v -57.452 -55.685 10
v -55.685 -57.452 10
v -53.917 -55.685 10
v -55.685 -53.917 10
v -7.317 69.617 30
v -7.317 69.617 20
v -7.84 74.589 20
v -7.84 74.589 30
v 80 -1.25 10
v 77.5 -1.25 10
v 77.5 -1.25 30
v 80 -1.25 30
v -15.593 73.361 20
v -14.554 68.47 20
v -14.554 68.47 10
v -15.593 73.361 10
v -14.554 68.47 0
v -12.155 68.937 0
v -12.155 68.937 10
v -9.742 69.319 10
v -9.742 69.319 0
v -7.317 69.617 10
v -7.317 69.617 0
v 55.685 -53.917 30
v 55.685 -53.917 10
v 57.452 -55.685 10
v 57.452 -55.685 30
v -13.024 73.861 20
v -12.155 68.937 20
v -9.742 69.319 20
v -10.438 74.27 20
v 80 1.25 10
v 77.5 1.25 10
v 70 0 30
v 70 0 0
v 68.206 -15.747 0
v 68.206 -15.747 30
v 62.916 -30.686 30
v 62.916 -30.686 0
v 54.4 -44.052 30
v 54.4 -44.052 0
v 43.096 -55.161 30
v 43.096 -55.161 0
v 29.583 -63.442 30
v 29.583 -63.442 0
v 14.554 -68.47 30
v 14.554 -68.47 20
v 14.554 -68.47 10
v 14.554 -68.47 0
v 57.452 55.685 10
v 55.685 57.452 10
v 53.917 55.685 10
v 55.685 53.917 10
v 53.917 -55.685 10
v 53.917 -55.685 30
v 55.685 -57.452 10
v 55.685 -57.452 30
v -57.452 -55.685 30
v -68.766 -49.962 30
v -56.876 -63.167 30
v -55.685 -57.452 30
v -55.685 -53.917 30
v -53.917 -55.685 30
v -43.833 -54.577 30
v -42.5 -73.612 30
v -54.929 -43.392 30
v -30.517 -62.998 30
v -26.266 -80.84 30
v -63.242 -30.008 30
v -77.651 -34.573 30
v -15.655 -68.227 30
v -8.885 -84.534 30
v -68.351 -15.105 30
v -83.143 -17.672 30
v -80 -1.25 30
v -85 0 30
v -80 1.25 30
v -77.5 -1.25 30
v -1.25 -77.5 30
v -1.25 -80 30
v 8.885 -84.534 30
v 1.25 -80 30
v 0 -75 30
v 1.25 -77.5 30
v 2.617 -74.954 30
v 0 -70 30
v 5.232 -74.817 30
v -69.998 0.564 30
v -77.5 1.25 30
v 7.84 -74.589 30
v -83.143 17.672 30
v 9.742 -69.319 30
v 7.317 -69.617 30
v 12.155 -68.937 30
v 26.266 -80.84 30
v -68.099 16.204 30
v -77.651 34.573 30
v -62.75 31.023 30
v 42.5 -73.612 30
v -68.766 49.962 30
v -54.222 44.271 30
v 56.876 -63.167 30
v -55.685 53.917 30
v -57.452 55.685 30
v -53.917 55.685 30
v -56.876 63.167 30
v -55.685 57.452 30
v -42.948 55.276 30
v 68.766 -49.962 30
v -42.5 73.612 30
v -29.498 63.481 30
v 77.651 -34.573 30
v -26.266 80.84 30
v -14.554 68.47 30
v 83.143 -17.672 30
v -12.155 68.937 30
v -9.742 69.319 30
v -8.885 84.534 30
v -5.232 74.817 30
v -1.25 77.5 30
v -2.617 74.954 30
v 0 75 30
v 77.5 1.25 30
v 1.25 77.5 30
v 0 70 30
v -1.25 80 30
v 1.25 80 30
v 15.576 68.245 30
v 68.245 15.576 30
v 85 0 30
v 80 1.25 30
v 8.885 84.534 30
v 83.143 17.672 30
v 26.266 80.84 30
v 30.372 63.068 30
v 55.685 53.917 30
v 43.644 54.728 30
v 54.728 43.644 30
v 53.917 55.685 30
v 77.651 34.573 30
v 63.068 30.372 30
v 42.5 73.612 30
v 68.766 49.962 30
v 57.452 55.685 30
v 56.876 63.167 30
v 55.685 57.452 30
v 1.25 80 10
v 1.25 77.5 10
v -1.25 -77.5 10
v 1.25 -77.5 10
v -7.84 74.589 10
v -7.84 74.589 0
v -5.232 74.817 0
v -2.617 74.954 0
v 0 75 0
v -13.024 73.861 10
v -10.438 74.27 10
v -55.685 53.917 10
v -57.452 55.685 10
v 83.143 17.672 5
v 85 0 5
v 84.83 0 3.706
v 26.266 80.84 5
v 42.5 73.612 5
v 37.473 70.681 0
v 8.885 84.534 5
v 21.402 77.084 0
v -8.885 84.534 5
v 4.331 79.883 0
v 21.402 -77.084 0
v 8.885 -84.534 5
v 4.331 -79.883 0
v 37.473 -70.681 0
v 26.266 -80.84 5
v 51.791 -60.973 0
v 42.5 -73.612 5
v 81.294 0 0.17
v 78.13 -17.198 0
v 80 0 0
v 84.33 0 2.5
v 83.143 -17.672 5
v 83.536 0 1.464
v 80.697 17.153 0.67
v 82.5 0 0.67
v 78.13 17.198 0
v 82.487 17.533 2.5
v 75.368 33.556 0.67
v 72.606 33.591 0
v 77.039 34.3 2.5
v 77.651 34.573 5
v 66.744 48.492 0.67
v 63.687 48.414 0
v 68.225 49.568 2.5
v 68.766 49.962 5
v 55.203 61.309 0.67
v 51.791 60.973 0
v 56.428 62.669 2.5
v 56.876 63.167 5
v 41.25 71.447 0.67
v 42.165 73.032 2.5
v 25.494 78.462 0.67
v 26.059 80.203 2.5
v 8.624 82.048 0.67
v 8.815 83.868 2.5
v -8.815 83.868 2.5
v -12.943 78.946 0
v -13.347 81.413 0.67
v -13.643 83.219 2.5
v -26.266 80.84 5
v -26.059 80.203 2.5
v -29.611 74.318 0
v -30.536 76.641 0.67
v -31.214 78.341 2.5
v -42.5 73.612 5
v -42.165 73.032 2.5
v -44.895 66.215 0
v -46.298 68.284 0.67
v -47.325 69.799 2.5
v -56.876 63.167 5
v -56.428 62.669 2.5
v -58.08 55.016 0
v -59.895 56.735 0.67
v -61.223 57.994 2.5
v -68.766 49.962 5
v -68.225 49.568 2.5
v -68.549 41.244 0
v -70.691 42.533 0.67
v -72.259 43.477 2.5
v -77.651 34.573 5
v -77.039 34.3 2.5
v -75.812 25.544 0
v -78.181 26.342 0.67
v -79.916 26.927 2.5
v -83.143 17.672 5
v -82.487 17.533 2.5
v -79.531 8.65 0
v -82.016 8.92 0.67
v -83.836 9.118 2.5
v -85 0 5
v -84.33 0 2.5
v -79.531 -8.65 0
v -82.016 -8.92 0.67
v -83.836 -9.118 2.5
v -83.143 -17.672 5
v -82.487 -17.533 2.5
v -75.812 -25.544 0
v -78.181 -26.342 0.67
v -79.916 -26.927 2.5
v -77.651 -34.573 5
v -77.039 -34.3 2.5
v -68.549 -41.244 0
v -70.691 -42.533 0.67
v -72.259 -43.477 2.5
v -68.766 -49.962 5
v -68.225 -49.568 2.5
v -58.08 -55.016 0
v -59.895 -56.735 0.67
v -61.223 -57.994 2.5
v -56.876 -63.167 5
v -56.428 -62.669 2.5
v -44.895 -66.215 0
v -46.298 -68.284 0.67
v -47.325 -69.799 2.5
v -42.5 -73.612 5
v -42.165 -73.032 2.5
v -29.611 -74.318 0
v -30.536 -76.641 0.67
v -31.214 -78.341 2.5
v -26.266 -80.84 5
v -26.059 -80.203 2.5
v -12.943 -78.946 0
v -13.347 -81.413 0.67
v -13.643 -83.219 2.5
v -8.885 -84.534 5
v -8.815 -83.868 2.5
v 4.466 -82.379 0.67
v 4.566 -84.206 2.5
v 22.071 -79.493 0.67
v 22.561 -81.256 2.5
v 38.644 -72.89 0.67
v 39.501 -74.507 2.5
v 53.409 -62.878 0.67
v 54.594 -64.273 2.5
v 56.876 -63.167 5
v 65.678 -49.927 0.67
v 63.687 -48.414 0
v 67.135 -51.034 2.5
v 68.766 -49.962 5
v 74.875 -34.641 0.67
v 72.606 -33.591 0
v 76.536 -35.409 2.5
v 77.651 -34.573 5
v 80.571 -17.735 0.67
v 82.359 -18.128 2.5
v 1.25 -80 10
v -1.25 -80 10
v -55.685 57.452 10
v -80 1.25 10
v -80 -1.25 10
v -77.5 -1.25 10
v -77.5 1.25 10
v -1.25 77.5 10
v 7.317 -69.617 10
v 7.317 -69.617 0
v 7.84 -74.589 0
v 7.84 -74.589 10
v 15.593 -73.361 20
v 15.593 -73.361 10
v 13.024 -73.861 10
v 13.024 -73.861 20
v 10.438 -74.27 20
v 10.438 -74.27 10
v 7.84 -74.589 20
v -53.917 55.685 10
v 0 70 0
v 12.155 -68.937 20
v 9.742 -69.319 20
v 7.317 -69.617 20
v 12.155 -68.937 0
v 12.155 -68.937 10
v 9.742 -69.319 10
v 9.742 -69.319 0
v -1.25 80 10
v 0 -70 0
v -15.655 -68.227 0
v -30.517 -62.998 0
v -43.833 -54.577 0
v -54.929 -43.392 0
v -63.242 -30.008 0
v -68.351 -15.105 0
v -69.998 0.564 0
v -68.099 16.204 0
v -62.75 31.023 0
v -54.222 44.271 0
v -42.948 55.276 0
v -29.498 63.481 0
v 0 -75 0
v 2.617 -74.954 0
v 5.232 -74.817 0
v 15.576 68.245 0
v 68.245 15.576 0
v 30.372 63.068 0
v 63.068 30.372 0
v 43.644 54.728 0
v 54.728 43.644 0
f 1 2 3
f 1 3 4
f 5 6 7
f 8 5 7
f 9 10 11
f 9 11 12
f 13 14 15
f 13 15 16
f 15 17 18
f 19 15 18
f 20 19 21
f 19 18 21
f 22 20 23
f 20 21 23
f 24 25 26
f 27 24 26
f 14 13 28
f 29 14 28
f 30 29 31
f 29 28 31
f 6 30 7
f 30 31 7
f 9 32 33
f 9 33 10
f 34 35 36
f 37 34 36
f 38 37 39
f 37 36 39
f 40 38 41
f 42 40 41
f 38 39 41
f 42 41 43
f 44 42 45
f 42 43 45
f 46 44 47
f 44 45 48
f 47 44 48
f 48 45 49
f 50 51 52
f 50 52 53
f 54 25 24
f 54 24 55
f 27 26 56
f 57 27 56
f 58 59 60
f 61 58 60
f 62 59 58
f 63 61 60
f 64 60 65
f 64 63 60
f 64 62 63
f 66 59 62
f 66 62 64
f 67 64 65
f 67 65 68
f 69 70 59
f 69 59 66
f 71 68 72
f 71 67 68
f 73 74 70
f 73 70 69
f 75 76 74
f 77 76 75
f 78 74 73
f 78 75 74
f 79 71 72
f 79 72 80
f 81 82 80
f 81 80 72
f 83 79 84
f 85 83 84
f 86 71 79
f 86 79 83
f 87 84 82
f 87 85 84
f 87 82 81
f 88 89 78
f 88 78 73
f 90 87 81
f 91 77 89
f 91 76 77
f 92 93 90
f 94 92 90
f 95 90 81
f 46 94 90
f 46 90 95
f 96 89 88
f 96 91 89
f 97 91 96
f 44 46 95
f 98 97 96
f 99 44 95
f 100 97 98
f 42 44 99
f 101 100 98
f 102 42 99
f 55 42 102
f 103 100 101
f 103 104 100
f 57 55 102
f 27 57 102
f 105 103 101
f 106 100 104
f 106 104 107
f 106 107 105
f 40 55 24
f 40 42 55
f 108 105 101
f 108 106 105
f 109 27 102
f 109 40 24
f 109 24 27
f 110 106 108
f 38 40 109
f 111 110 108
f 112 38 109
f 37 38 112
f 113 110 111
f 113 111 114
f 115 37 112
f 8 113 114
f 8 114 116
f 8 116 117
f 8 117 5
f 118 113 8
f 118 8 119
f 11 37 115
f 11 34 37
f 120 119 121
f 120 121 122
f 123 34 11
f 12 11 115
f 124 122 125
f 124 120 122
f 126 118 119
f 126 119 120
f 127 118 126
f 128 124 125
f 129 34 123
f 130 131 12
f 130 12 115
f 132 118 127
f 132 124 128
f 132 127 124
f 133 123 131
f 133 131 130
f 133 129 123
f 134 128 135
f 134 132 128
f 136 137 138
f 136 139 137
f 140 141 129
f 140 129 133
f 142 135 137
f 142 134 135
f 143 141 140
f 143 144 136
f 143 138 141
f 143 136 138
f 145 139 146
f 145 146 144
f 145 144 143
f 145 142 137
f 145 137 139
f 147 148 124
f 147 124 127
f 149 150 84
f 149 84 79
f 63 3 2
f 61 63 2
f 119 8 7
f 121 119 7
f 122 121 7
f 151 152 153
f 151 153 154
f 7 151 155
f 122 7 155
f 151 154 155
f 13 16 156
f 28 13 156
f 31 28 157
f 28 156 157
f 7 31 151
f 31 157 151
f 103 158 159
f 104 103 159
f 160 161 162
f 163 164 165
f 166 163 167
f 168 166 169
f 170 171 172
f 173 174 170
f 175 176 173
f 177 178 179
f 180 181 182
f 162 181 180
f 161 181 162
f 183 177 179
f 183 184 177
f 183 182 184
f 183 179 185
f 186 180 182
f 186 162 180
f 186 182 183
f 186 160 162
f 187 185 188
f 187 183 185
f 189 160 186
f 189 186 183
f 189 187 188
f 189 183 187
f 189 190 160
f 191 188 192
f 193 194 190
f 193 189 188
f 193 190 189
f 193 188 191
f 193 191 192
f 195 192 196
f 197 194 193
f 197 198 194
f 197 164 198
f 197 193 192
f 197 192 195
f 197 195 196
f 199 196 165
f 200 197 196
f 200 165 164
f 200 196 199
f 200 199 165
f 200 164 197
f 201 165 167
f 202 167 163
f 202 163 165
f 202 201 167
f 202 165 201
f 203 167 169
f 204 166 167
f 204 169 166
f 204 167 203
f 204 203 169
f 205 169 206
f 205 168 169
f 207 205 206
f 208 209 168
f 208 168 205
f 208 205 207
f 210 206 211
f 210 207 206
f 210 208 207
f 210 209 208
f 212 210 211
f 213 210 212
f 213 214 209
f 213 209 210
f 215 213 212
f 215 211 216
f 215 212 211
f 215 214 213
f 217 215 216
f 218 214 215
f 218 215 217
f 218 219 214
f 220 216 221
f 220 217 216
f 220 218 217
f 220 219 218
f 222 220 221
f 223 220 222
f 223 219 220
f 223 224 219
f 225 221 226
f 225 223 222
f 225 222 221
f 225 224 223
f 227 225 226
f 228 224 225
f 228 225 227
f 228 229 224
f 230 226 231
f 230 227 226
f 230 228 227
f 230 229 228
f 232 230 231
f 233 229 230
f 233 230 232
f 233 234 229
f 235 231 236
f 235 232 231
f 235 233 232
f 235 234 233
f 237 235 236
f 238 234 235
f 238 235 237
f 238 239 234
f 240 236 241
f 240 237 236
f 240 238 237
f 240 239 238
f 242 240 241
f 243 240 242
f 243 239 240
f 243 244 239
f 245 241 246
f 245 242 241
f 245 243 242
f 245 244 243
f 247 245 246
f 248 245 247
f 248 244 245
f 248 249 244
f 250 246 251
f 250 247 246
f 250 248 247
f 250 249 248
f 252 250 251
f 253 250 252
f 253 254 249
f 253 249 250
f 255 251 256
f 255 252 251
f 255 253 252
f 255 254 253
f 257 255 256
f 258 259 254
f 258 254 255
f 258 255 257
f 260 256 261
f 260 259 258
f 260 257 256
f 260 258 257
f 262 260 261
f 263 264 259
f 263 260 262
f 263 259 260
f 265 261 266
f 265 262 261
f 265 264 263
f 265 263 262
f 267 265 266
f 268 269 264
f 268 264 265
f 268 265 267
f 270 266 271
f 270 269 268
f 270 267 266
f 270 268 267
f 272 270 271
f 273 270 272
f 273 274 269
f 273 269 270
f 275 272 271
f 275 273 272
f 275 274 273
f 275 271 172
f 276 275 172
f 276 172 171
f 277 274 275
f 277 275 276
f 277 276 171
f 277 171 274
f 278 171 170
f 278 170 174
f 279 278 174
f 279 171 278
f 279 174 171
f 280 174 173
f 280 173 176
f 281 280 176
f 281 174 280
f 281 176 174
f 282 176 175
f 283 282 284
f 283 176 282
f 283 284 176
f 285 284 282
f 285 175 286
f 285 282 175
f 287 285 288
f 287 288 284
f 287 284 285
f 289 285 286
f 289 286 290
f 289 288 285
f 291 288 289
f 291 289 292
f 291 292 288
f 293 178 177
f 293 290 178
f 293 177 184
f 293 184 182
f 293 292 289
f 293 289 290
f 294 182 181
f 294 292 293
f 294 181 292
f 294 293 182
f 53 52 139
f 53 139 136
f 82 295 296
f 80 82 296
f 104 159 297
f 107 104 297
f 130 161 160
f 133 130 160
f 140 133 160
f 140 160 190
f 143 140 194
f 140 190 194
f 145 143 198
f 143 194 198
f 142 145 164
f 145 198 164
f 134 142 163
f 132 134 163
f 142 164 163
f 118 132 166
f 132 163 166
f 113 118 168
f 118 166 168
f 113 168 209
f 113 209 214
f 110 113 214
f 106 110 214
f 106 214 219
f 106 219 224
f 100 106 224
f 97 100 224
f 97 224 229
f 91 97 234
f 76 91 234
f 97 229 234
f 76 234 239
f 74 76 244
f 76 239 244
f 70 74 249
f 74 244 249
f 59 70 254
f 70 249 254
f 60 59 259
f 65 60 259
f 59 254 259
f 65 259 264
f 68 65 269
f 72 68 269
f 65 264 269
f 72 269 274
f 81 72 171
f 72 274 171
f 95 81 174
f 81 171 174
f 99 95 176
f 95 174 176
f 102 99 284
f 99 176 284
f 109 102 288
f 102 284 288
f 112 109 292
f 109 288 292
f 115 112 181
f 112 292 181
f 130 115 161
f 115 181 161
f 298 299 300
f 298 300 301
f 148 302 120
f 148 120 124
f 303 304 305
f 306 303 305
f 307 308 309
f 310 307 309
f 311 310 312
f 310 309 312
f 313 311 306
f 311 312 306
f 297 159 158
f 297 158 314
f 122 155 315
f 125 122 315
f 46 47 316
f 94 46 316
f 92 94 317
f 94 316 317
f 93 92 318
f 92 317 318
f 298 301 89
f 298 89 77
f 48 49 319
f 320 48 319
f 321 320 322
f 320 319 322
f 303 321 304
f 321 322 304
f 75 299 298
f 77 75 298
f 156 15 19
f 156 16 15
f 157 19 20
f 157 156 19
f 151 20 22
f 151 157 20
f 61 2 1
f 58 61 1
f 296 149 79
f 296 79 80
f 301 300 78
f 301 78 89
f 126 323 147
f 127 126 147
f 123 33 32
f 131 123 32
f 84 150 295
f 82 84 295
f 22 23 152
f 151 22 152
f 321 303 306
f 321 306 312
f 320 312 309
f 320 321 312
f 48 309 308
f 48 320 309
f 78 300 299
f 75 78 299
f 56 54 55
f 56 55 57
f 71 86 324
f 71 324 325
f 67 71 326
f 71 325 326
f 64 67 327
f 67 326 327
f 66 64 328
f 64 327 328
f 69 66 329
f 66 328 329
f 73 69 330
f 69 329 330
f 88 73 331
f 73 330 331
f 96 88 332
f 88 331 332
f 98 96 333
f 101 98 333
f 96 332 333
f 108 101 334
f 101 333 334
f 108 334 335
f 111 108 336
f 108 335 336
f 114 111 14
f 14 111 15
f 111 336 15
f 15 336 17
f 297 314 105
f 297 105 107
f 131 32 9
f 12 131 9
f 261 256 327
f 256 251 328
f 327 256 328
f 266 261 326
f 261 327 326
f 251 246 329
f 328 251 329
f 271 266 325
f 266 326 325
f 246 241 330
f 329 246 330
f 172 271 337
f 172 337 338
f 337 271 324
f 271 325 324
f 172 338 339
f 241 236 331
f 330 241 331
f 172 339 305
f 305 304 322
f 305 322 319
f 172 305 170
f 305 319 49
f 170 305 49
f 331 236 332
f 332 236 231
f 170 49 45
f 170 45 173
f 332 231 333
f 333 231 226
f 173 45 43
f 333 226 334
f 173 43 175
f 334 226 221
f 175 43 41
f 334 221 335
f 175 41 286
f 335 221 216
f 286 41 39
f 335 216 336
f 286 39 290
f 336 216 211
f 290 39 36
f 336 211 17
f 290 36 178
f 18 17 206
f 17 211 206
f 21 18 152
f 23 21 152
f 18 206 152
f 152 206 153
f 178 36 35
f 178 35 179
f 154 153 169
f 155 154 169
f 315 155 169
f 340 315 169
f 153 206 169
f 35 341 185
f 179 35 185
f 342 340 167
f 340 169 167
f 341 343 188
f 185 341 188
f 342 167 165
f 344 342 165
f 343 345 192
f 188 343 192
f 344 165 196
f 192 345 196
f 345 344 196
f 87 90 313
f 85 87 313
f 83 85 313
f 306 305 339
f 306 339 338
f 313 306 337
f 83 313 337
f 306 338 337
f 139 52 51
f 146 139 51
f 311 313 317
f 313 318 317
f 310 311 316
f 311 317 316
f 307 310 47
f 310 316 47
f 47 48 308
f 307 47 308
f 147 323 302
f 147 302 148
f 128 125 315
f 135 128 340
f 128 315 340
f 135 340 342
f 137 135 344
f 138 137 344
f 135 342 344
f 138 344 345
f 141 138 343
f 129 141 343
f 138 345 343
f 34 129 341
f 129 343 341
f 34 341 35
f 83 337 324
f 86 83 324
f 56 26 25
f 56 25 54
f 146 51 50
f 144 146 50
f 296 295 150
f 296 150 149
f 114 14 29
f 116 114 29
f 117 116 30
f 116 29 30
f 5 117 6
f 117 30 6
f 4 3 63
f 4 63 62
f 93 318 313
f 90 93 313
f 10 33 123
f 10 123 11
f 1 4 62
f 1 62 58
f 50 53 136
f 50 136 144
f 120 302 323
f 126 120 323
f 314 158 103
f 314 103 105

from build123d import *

# Parameters (mm, degrees)
F0_R     = 85
F1_DEPTH = 30
F2_DEPTH = 10
F5_DEPTH = 10
F6_W     = 2.5
F6_H     = 2.5
F7_DEPTH = 20
F9_COUNT = 8
F11_R    = 5


with BuildPart() as f1:
    # F0 (on Top) → F1 (new body)
    with BuildSketch(Plane.XY):
        Circle(F0_R)
        with BuildLine():
            ThreePointArc((-7.8396347451, 74.5891421526), (-3.9251967182, 74.8972151066), (0, 75))
            ThreePointArc((0, 75), (53.033008589, 53.033008589), (75, 0))
            ThreePointArc((75, 0), (58.2859471093, -47.1990293287), (15.5933768113, -73.361070055))
            ThreePointArc((15.5933768113, -73.361070055), (11.732584878, -74.0766255446), (7.8396347451, -74.5891421526))
            ThreePointArc((7.8396347451, -74.5891421526), (3.9251967182, -74.8972151066), (0, -75))
            ThreePointArc((0, -75), (-74.5891421526, -7.8396347451), (-15.5933768113, 73.361070055))
            ThreePointArc((-15.5933768113, 73.361070055), (-11.732584878, 74.0766255446), (-7.8396347451, 74.5891421526))
        make_face(mode=Mode.SUBTRACT)
        with BuildLine():
            ThreePointArc((0, -70), (-69.6165326758, -7.3169924287), (-14.5538183572, 68.4703320514))
            Line((-14.5538183572, 68.4703320514), (-15.5933768113, 73.361070055))
            ThreePointArc((-15.5933768113, 73.361070055), (-74.5891421526, -7.8396347451), (0, -75))
            Line((0, -75), (0, -70))
        make_face()
        with BuildLine():
            ThreePointArc((0, 70), (49.4974746831, 49.4974746831), (70, 0))
            ThreePointArc((70, 0), (54.400217302, -44.0524273735), (14.5538183572, -68.4703320514))
            Line((14.5538183572, -68.4703320514), (15.5933768113, -73.361070055))
            ThreePointArc((15.5933768113, -73.361070055), (58.2859471093, -47.1990293287), (75, 0))
            ThreePointArc((75, 0), (53.033008589, 53.033008589), (0, 75))
            Line((0, 75), (0, 70))
        make_face()
    extrude(amount=F1_DEPTH)

    # F0 (on Top) → F2 (join)
    with BuildSketch(Plane.XY):
        with BuildLine():
            ThreePointArc((-14.5538183572, 68.4703320514), (-10.9504125528, 69.1381838417), (-7.3169924287, 69.6165326758))
            Line((-7.3169924287, 69.6165326758), (-7.8396347451, 74.5891421526))
            ThreePointArc((-7.8396347451, 74.5891421526), (-11.732584878, 74.0766255446), (-15.5933768113, 73.361070055))
            Line((-15.5933768113, 73.361070055), (-14.5538183572, 68.4703320514))
        make_face()
        with BuildLine():
            Line((15.5933768113, -73.361070055), (14.5538183572, -68.4703320514))
            ThreePointArc((14.5538183572, -68.4703320514), (10.9504125528, -69.1381838417), (7.3169924287, -69.6165326758))
            Line((7.3169924287, -69.6165326758), (7.8396347451, -74.5891421526))
            ThreePointArc((7.8396347451, -74.5891421526), (11.732584878, -74.0766255446), (15.5933768113, -73.361070055))
        make_face()
    extrude(amount=F2_DEPTH)

    # F4 (on offset) → F5 (join)
    with BuildSketch(Plane.XY.offset(20)):
        with BuildLine():
            Line((-7.3169924287, 69.6165326758), (-7.8396347451, 74.5891421526))
            ThreePointArc((-7.8396347451, 74.5891421526), (-11.732584878, 74.0766255446), (-15.5933768113, 73.361070055))
            Line((-15.5933768113, 73.361070055), (-14.5538183572, 68.4703320514))
            ThreePointArc((-14.5538183572, 68.4703320514), (-10.9504125528, 69.1381838417), (-7.3169924287, 69.6165326758))
        make_face()
        with BuildLine():
            ThreePointArc((7.8396347451, -74.5891421526), (11.732584878, -74.0766255446), (15.5933768113, -73.361070055))
            Line((15.5933768113, -73.361070055), (14.5538183572, -68.4703320514))
            ThreePointArc((14.5538183572, -68.4703320514), (10.9504125528, -69.1381838417), (7.3169924287, -69.6165326758))
            Line((7.3169924287, -69.6165326758), (7.8396347451, -74.5891421526))
        make_face()
    extrude(amount=F5_DEPTH)


with BuildPart() as f7:
    # F6 (on face) → F7 (new body, symmetric)
    with BuildSketch(Plane.XY.offset(30)):
        with Locations((0, 78.75)):
            Rectangle(F6_W, F6_H)
    extrude(amount=F7_DEPTH, both=True)


with BuildPart() as f9_1:
    # F9: instance of F7
    add(f7.part.rotate(Axis((0, 0, 11.2639116123), (0, 0, 1)), 1 * 360 / F9_COUNT))


with BuildPart() as f9_2:
    # F9: instance of F7
    add(f7.part.rotate(Axis((0, 0, 11.2639116123), (0, 0, 1)), 2 * 360 / F9_COUNT))


with BuildPart() as f9_3:
    # F9: instance of F7
    add(f7.part.rotate(Axis((0, 0, 11.2639116123), (0, 0, 1)), 3 * 360 / F9_COUNT))


with BuildPart() as f9_4:
    # F9: instance of F7
    add(f7.part.rotate(Axis((0, 0, 11.2639116123), (0, 0, 1)), 4 * 360 / F9_COUNT))


with BuildPart() as f9_5:
    # F9: instance of F7
    add(f7.part.rotate(Axis((0, 0, 11.2639116123), (0, 0, 1)), 5 * 360 / F9_COUNT))


with BuildPart() as f9_6:
    # F9: instance of F7
    add(f7.part.rotate(Axis((0, 0, 11.2639116123), (0, 0, 1)), 6 * 360 / F9_COUNT))


with BuildPart() as f9_7:
    # F9: instance of F7
    add(f7.part.rotate(Axis((0, 0, 11.2639116123), (0, 0, 1)), 7 * 360 / F9_COUNT))


with BuildPart() as f1_1:
    add(f1.part)

    # F10: cut F9_2, F9_1, F7, F9_7, F9_6, F9_5, F9_4, F9_3
    add(f9_2.part, mode=Mode.SUBTRACT)
    add(f9_1.part, mode=Mode.SUBTRACT)
    add(f7.part, mode=Mode.SUBTRACT)
    add(f9_7.part, mode=Mode.SUBTRACT)
    add(f9_6.part, mode=Mode.SUBTRACT)
    add(f9_5.part, mode=Mode.SUBTRACT)
    add(f9_4.part, mode=Mode.SUBTRACT)
    add(f9_3.part, mode=Mode.SUBTRACT)

    # F11
    f11_edges = [f1_1.edges().sort_by_distance(p)[0] for p in [
        (-85, 0, 0),
    ]]
    fillet(f11_edges, radius=F11_R)


solid = f1_1.part
